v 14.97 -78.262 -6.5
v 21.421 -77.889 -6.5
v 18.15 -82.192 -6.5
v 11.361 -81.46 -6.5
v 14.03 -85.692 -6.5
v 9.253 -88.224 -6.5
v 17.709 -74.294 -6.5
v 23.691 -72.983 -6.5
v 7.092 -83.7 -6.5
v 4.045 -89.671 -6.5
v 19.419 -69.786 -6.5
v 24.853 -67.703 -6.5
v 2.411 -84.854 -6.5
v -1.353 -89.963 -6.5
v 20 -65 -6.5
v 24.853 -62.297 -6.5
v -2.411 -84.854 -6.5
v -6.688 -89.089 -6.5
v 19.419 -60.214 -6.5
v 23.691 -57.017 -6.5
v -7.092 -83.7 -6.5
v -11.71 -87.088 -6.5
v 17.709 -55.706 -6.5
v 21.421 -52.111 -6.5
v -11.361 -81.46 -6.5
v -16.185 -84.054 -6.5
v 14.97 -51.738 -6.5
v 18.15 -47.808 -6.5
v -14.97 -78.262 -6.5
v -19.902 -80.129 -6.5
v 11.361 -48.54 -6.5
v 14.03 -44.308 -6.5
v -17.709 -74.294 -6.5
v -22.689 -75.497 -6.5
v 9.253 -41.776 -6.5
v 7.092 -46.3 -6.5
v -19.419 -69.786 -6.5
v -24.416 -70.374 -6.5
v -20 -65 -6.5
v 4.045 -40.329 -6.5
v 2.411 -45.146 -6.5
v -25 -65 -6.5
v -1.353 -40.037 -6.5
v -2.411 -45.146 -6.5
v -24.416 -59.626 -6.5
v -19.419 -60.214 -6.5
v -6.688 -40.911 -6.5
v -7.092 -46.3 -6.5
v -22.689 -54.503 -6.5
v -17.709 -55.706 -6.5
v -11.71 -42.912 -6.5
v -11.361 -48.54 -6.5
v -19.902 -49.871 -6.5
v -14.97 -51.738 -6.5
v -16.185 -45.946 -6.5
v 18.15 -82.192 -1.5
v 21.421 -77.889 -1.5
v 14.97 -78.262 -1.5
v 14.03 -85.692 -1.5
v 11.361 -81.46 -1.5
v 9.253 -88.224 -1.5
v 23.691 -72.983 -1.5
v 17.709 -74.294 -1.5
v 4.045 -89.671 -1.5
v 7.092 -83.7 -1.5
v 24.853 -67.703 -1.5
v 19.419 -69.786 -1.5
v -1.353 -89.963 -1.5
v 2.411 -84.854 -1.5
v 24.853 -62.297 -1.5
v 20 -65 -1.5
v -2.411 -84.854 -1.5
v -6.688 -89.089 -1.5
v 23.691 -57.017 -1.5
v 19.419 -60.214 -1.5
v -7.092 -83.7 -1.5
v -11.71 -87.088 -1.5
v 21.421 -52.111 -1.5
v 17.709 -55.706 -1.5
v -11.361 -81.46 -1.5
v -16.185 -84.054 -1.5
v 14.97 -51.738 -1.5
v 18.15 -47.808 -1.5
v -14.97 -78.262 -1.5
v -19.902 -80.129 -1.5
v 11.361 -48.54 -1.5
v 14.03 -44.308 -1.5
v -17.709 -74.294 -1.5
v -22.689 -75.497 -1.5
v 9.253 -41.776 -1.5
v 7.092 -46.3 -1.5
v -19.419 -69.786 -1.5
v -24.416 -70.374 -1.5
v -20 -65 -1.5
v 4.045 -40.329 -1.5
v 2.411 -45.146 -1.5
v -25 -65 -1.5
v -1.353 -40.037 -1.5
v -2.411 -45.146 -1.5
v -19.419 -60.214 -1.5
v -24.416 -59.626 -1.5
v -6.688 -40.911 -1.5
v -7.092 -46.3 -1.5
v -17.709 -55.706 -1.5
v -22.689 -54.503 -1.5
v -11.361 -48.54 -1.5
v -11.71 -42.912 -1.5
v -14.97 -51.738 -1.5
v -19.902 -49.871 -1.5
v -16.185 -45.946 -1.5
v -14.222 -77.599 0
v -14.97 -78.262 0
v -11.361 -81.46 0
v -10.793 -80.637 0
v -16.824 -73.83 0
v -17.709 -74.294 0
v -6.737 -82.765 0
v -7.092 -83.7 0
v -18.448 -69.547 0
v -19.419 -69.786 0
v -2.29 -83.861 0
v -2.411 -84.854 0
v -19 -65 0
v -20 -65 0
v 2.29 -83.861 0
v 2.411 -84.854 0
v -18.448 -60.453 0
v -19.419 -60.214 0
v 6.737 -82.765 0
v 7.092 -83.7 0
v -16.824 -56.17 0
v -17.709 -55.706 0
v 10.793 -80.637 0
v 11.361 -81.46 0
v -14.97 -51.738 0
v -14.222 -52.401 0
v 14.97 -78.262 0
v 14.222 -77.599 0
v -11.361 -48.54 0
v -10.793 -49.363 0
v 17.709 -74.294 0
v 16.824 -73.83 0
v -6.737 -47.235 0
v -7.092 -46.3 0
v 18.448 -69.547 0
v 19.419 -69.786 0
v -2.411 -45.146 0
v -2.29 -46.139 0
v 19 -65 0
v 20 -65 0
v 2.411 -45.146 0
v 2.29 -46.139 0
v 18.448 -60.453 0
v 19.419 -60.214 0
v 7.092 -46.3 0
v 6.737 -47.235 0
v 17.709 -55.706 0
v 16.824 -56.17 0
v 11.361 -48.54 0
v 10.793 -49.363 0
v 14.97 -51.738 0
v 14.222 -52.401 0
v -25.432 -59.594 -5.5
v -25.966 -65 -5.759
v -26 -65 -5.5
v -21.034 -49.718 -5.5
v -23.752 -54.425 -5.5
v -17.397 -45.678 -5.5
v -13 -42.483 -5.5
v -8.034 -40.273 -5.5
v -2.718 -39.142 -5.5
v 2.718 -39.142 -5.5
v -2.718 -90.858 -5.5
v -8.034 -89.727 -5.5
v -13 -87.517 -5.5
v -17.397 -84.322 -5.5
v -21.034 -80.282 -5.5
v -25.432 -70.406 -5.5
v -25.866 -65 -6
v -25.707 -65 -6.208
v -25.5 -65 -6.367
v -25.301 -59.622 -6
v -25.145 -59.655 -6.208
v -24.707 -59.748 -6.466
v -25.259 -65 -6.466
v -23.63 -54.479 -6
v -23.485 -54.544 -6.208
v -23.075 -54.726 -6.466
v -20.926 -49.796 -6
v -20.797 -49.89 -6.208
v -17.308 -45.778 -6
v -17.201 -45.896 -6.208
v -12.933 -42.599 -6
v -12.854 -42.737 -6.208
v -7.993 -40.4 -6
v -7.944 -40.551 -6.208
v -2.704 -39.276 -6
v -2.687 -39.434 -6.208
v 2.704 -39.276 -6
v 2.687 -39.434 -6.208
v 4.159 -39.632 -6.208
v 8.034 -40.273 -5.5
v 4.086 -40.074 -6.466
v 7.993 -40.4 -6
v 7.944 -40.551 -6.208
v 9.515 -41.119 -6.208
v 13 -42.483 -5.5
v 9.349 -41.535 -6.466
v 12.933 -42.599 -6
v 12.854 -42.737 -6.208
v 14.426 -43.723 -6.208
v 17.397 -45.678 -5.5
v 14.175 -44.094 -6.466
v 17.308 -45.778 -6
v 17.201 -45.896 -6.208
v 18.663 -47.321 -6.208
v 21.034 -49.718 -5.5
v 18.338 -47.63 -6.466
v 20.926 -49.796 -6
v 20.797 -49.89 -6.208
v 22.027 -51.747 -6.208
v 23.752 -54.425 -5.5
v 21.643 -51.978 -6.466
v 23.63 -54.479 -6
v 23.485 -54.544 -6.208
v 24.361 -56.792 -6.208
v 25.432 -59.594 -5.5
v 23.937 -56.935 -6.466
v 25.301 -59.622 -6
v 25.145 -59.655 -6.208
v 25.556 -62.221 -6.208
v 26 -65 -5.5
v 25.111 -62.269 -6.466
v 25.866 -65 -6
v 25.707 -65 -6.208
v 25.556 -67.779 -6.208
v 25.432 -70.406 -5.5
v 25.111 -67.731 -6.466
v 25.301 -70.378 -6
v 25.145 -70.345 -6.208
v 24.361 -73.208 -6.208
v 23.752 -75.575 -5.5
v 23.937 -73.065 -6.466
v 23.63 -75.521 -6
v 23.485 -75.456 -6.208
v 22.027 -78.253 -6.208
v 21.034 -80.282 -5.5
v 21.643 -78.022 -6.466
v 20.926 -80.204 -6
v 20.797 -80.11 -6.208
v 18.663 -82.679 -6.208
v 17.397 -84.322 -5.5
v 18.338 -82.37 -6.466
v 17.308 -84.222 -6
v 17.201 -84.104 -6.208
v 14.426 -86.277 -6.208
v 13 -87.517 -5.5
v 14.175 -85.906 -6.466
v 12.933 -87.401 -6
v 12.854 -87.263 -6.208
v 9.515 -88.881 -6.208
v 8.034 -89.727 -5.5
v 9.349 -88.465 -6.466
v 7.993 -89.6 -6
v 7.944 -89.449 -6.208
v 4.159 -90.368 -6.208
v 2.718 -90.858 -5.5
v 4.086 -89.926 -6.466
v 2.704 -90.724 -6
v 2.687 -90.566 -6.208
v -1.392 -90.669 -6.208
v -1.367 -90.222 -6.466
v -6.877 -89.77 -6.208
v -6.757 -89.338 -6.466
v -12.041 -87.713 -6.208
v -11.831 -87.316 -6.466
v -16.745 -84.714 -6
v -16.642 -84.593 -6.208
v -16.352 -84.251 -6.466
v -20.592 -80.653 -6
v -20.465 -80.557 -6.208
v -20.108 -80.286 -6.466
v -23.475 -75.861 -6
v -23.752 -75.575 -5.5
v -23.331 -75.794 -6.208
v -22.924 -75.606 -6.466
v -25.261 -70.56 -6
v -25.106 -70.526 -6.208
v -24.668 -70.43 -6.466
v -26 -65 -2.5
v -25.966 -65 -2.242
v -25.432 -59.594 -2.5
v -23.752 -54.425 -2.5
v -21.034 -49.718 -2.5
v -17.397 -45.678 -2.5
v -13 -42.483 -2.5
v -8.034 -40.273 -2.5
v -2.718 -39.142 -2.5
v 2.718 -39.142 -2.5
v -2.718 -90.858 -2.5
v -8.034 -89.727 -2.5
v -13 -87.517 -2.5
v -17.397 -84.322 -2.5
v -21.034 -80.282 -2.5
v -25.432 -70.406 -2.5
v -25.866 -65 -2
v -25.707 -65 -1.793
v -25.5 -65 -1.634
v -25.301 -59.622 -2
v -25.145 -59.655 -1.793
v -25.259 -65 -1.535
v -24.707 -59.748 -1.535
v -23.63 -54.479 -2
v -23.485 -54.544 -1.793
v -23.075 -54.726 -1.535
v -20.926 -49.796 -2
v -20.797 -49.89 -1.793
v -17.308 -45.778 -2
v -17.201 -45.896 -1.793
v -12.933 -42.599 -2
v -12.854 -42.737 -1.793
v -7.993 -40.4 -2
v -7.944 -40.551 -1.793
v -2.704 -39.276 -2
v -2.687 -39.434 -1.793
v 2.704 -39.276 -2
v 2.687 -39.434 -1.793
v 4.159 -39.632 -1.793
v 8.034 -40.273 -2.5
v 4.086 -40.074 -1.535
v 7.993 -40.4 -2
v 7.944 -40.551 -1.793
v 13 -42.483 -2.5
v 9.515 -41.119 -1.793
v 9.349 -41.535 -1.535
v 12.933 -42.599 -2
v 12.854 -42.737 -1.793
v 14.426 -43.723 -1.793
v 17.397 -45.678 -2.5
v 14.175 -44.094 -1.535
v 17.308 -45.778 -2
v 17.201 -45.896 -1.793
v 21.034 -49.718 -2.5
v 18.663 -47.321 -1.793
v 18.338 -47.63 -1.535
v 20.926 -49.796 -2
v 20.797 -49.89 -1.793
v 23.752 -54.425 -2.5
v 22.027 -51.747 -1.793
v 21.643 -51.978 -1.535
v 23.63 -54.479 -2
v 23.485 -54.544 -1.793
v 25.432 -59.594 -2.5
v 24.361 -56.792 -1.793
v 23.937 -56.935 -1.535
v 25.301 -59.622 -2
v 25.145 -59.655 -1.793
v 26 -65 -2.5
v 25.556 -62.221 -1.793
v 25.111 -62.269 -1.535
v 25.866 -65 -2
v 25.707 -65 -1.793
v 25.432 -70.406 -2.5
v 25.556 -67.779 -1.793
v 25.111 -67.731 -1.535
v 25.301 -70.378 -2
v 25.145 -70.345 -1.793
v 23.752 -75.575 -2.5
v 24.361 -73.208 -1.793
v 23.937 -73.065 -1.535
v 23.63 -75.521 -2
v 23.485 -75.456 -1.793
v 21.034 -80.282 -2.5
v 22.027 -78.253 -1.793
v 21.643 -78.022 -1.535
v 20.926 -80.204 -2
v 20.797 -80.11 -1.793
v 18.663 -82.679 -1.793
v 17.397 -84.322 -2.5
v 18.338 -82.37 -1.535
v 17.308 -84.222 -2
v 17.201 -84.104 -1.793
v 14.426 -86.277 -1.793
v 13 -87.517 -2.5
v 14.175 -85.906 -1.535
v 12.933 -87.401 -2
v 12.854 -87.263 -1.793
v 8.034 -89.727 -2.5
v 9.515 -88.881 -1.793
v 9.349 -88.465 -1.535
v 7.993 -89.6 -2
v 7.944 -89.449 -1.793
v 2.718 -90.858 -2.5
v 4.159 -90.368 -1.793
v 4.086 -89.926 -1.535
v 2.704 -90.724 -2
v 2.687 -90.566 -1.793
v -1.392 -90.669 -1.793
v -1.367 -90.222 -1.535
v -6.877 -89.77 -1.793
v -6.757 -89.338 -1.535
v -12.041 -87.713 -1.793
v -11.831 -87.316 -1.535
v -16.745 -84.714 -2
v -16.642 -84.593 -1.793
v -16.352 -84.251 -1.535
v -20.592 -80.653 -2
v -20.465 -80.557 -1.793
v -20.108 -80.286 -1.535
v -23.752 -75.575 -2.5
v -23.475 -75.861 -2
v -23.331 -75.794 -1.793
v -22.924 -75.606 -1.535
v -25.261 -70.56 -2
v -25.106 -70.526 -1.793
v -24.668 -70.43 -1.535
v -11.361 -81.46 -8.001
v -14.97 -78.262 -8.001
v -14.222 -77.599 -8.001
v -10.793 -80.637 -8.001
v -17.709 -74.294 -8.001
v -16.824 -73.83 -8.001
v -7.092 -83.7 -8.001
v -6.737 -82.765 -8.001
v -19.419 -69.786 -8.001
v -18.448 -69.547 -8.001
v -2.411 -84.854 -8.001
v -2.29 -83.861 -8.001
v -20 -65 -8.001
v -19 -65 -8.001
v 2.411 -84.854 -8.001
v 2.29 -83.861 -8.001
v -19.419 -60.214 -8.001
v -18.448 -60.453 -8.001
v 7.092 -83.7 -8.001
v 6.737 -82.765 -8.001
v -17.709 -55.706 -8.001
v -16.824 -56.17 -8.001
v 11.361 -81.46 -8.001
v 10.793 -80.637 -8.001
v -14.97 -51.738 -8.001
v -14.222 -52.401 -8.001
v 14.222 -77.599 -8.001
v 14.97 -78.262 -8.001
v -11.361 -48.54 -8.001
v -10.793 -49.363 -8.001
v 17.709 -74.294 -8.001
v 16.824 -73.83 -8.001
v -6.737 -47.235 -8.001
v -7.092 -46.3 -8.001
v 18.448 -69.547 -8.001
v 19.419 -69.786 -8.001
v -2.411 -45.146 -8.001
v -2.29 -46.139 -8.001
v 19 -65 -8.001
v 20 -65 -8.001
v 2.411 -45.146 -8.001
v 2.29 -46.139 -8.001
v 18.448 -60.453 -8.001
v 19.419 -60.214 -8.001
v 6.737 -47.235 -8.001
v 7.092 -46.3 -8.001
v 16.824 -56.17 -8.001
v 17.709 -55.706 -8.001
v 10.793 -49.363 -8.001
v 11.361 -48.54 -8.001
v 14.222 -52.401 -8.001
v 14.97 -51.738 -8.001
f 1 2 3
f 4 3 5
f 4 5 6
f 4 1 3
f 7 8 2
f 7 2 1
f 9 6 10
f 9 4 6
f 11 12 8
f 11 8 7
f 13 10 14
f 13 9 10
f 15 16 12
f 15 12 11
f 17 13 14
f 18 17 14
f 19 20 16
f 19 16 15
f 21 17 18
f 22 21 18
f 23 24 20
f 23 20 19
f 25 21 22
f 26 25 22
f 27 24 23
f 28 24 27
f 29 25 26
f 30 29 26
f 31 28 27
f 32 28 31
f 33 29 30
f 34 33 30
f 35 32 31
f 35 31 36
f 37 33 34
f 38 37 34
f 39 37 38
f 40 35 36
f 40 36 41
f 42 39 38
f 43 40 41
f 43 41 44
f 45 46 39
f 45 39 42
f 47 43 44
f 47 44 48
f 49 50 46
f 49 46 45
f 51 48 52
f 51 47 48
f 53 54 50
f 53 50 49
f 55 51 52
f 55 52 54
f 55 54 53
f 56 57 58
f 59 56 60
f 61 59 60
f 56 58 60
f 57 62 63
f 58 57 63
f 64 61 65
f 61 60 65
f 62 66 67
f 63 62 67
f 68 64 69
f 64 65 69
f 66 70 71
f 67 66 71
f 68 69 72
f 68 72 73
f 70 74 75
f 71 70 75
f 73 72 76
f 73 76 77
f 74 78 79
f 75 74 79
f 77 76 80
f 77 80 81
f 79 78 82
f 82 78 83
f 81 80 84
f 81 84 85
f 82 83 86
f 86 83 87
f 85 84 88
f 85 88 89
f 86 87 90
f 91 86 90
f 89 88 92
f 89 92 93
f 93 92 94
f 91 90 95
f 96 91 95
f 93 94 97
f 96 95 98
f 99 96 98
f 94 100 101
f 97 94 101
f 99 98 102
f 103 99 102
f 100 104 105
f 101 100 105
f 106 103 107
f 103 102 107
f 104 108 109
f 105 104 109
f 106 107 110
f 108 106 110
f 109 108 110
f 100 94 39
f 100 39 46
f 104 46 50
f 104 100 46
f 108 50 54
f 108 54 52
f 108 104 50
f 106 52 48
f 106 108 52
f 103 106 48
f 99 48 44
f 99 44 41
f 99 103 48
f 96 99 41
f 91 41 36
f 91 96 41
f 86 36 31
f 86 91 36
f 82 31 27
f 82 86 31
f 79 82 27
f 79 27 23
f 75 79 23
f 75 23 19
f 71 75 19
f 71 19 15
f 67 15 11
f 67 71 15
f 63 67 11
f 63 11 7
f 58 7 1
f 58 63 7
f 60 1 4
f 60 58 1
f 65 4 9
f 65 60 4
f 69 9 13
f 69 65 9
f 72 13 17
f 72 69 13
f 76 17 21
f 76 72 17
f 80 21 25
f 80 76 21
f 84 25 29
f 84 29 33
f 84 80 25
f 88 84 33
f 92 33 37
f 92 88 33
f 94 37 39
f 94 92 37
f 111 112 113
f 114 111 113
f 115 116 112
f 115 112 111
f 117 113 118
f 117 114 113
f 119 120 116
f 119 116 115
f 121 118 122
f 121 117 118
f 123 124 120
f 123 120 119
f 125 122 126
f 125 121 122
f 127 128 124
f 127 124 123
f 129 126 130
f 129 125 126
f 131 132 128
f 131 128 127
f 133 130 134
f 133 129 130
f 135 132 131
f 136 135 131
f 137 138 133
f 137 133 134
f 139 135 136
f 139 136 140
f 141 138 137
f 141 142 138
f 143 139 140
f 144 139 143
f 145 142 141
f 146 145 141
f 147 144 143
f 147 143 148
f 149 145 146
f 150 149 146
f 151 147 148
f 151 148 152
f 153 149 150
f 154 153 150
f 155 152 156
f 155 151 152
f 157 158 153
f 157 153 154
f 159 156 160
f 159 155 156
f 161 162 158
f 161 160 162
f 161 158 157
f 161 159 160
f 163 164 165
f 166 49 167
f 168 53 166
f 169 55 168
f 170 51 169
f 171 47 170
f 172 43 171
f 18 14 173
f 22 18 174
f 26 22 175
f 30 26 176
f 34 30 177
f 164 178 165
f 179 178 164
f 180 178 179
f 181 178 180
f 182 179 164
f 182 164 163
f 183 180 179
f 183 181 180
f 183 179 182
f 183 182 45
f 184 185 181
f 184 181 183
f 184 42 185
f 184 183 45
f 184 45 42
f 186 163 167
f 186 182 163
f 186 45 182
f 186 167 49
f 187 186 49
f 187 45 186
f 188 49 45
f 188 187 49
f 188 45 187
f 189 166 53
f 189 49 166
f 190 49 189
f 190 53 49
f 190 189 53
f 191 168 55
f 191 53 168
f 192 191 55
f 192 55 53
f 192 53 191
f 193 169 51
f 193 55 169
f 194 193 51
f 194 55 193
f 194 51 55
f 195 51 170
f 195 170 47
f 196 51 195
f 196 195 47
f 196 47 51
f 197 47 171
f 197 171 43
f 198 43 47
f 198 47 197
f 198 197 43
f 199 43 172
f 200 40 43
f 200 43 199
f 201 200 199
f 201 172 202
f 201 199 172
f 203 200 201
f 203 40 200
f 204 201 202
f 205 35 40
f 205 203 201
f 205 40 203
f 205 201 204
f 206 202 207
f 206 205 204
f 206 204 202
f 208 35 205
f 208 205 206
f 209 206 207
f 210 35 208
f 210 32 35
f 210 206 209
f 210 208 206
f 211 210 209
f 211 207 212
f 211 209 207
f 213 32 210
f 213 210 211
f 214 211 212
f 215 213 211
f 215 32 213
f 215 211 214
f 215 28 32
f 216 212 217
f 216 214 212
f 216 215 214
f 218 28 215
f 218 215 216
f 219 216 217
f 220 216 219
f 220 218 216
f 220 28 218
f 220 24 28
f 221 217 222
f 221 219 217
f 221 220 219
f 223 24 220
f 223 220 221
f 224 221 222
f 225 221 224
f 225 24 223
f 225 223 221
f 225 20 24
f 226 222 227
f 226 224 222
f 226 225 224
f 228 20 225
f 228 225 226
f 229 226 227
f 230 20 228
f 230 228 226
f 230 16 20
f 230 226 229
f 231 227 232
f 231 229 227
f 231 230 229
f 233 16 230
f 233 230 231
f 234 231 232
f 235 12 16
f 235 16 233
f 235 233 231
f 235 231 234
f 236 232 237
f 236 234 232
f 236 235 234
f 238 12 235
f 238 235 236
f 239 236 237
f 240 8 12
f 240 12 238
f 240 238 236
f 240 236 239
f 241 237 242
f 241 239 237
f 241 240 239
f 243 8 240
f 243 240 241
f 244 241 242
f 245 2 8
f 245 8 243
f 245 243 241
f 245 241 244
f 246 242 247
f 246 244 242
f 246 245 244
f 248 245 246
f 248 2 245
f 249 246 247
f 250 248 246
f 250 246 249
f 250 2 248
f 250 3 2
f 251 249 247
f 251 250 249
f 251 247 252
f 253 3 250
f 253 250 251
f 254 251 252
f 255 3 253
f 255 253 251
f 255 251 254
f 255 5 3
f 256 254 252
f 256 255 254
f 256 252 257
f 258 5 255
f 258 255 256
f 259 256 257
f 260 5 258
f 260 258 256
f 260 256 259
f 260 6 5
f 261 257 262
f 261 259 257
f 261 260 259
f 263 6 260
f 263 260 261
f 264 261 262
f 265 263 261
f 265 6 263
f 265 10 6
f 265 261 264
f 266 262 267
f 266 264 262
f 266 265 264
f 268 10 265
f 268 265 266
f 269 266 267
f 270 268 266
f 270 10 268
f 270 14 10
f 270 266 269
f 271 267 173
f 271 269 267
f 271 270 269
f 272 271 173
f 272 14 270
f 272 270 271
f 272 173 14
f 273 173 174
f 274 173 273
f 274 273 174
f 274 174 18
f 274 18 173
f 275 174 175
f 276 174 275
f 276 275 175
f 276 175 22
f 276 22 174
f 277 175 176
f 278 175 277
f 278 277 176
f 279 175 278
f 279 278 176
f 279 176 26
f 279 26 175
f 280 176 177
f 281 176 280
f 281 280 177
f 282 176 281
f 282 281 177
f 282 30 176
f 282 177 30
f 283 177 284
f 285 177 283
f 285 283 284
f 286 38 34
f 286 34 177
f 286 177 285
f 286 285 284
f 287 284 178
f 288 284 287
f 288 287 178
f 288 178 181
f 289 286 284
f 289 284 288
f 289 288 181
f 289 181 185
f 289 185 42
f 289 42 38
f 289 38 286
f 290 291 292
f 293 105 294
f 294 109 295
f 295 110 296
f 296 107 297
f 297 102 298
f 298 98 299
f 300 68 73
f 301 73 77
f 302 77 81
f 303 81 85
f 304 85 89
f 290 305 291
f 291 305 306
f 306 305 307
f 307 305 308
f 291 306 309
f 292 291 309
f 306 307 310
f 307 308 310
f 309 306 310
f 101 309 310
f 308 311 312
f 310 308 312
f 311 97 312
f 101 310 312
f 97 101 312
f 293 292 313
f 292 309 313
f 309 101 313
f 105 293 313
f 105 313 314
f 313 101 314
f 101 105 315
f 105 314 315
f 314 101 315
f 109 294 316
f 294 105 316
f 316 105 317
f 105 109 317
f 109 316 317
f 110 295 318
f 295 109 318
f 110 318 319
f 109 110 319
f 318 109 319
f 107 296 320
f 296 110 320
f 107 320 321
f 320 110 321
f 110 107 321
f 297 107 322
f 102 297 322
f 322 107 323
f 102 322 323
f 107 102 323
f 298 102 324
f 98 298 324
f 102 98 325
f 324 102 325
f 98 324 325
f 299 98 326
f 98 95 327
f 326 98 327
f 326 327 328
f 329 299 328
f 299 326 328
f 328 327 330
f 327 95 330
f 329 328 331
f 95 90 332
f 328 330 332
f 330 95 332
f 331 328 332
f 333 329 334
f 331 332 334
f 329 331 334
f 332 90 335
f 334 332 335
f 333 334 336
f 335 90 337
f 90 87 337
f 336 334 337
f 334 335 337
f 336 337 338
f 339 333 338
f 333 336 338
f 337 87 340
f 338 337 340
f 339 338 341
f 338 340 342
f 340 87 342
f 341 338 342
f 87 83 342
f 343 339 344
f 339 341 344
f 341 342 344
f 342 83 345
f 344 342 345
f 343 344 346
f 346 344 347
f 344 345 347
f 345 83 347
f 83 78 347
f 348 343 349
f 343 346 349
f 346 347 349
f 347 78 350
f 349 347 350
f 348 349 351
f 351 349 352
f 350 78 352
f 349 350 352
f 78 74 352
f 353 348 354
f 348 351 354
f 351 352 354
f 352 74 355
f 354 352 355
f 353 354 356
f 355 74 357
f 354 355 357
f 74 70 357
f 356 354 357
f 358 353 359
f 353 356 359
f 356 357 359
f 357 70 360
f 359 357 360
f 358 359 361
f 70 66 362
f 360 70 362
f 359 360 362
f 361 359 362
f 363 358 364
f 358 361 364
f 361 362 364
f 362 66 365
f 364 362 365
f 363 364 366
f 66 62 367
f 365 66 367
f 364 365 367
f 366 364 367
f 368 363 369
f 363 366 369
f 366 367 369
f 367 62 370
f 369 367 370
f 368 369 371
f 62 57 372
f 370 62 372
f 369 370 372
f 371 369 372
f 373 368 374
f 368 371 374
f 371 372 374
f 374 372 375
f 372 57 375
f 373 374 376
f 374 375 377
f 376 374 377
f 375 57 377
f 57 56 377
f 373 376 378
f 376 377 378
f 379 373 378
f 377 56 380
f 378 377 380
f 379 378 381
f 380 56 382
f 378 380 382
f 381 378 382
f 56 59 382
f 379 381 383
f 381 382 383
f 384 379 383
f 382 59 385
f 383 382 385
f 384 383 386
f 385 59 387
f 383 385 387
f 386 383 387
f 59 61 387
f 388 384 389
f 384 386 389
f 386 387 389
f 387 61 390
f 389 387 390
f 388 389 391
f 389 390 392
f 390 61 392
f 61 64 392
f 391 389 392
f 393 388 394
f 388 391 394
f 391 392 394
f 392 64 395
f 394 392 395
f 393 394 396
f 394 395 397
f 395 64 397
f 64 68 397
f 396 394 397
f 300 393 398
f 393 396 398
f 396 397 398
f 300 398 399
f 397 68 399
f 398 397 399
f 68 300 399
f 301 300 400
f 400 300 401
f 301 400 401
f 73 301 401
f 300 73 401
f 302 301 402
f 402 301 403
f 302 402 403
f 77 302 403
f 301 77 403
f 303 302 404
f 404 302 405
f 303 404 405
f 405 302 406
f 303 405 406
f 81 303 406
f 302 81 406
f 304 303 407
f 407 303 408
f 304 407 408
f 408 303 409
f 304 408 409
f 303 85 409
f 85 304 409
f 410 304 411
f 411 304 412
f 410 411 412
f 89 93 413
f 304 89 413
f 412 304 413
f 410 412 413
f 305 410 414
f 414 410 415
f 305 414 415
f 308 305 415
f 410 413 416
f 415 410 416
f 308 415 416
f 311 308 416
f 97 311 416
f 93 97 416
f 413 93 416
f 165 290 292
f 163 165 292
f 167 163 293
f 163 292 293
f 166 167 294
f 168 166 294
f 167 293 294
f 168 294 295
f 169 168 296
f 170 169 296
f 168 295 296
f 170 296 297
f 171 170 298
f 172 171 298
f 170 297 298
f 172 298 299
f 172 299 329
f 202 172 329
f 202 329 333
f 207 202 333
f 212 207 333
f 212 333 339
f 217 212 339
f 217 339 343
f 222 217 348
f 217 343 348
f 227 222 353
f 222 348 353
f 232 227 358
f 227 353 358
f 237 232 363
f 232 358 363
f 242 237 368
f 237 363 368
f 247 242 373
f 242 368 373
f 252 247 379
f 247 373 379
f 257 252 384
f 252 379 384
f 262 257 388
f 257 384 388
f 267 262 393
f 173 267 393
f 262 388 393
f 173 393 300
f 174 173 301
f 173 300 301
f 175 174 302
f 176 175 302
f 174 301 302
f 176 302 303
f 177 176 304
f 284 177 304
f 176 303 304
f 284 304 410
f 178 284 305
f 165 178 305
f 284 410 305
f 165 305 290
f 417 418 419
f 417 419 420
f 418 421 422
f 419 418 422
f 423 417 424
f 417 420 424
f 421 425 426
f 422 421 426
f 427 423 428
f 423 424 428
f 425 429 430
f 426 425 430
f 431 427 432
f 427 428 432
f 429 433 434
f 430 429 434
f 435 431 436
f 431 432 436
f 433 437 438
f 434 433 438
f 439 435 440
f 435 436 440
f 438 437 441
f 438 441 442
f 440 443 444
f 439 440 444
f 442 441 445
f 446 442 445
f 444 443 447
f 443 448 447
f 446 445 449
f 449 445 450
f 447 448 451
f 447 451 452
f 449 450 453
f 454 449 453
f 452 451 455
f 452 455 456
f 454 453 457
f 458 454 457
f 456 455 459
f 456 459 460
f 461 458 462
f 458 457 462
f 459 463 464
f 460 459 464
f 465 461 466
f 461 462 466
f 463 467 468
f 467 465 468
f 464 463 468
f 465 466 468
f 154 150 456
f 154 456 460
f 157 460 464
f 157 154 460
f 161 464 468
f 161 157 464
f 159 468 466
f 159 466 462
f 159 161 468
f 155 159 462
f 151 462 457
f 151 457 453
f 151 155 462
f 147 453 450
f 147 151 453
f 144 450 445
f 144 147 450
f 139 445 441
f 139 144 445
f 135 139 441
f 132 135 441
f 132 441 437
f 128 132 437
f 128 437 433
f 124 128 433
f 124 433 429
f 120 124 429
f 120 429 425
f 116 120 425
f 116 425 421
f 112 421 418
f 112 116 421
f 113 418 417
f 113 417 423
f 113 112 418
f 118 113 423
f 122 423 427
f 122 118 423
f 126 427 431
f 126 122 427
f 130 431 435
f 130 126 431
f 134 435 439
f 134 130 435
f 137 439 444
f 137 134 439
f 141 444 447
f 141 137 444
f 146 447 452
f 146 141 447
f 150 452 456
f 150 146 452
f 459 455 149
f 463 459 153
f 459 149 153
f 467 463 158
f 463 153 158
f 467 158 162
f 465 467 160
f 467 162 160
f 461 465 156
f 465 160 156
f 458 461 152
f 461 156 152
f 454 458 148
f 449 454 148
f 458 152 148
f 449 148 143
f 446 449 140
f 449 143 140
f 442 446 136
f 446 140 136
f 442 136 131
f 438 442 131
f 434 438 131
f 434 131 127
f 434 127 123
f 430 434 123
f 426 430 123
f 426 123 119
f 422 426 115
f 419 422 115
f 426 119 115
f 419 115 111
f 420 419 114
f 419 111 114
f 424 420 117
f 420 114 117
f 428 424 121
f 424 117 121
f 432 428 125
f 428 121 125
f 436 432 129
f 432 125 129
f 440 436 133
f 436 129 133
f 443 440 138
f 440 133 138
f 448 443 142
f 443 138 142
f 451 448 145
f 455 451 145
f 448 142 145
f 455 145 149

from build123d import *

# Parameters (mm, degrees)
SKETCH1_R                = 20
SKETCH1_R_2              = 19
BOSS_EXTRUDE1_DEPTH      = 8.001
BOSS_EXTRUDE2_DEPTH      = 2.5
BOSS_EXTRUDE2_DEPTH_BACK = 2.5
SKETCH2_R                = 26
SKETCH2_R_2              = 20
FILLET1_R                = 1


with BuildPart() as part:
    # Sketch1 → Boss-Extrude1 (new body)
    with BuildSketch(Plane.XY):
        with Locations((0, -65)):
            Circle(SKETCH1_R)
        with Locations((0, -65)):
            Circle(SKETCH1_R_2, mode=Mode.SUBTRACT)
    extrude(amount=-BOSS_EXTRUDE1_DEPTH)


with BuildPart() as body_2:
    # Sketch2 → Boss-Extrude2 (new, two sides: drawn at the far end of the back side and taken through both)
    with BuildSketch(Plane(origin=(0, 0, -4.0005), x_dir=(-1, 0, 0), z_dir=(0, 0, -1)).offset(-BOSS_EXTRUDE2_DEPTH_BACK)):
        with Locations((0, -65)):
            Circle(SKETCH2_R)
        with Locations((0, -65)):
            Circle(SKETCH2_R_2, mode=Mode.SUBTRACT)
    extrude(amount=BOSS_EXTRUDE2_DEPTH + BOSS_EXTRUDE2_DEPTH_BACK)

    # Fillet1
    fillet1_edges = [body_2.edges().sort_by_distance(p)[0] for p in [
        (26, -65, -1.5005),
        (26, -65, -6.5005),
    ]]
    fillet(fillet1_edges, radius=FILLET1_R)


solid = Compound([part.part, body_2.part])
